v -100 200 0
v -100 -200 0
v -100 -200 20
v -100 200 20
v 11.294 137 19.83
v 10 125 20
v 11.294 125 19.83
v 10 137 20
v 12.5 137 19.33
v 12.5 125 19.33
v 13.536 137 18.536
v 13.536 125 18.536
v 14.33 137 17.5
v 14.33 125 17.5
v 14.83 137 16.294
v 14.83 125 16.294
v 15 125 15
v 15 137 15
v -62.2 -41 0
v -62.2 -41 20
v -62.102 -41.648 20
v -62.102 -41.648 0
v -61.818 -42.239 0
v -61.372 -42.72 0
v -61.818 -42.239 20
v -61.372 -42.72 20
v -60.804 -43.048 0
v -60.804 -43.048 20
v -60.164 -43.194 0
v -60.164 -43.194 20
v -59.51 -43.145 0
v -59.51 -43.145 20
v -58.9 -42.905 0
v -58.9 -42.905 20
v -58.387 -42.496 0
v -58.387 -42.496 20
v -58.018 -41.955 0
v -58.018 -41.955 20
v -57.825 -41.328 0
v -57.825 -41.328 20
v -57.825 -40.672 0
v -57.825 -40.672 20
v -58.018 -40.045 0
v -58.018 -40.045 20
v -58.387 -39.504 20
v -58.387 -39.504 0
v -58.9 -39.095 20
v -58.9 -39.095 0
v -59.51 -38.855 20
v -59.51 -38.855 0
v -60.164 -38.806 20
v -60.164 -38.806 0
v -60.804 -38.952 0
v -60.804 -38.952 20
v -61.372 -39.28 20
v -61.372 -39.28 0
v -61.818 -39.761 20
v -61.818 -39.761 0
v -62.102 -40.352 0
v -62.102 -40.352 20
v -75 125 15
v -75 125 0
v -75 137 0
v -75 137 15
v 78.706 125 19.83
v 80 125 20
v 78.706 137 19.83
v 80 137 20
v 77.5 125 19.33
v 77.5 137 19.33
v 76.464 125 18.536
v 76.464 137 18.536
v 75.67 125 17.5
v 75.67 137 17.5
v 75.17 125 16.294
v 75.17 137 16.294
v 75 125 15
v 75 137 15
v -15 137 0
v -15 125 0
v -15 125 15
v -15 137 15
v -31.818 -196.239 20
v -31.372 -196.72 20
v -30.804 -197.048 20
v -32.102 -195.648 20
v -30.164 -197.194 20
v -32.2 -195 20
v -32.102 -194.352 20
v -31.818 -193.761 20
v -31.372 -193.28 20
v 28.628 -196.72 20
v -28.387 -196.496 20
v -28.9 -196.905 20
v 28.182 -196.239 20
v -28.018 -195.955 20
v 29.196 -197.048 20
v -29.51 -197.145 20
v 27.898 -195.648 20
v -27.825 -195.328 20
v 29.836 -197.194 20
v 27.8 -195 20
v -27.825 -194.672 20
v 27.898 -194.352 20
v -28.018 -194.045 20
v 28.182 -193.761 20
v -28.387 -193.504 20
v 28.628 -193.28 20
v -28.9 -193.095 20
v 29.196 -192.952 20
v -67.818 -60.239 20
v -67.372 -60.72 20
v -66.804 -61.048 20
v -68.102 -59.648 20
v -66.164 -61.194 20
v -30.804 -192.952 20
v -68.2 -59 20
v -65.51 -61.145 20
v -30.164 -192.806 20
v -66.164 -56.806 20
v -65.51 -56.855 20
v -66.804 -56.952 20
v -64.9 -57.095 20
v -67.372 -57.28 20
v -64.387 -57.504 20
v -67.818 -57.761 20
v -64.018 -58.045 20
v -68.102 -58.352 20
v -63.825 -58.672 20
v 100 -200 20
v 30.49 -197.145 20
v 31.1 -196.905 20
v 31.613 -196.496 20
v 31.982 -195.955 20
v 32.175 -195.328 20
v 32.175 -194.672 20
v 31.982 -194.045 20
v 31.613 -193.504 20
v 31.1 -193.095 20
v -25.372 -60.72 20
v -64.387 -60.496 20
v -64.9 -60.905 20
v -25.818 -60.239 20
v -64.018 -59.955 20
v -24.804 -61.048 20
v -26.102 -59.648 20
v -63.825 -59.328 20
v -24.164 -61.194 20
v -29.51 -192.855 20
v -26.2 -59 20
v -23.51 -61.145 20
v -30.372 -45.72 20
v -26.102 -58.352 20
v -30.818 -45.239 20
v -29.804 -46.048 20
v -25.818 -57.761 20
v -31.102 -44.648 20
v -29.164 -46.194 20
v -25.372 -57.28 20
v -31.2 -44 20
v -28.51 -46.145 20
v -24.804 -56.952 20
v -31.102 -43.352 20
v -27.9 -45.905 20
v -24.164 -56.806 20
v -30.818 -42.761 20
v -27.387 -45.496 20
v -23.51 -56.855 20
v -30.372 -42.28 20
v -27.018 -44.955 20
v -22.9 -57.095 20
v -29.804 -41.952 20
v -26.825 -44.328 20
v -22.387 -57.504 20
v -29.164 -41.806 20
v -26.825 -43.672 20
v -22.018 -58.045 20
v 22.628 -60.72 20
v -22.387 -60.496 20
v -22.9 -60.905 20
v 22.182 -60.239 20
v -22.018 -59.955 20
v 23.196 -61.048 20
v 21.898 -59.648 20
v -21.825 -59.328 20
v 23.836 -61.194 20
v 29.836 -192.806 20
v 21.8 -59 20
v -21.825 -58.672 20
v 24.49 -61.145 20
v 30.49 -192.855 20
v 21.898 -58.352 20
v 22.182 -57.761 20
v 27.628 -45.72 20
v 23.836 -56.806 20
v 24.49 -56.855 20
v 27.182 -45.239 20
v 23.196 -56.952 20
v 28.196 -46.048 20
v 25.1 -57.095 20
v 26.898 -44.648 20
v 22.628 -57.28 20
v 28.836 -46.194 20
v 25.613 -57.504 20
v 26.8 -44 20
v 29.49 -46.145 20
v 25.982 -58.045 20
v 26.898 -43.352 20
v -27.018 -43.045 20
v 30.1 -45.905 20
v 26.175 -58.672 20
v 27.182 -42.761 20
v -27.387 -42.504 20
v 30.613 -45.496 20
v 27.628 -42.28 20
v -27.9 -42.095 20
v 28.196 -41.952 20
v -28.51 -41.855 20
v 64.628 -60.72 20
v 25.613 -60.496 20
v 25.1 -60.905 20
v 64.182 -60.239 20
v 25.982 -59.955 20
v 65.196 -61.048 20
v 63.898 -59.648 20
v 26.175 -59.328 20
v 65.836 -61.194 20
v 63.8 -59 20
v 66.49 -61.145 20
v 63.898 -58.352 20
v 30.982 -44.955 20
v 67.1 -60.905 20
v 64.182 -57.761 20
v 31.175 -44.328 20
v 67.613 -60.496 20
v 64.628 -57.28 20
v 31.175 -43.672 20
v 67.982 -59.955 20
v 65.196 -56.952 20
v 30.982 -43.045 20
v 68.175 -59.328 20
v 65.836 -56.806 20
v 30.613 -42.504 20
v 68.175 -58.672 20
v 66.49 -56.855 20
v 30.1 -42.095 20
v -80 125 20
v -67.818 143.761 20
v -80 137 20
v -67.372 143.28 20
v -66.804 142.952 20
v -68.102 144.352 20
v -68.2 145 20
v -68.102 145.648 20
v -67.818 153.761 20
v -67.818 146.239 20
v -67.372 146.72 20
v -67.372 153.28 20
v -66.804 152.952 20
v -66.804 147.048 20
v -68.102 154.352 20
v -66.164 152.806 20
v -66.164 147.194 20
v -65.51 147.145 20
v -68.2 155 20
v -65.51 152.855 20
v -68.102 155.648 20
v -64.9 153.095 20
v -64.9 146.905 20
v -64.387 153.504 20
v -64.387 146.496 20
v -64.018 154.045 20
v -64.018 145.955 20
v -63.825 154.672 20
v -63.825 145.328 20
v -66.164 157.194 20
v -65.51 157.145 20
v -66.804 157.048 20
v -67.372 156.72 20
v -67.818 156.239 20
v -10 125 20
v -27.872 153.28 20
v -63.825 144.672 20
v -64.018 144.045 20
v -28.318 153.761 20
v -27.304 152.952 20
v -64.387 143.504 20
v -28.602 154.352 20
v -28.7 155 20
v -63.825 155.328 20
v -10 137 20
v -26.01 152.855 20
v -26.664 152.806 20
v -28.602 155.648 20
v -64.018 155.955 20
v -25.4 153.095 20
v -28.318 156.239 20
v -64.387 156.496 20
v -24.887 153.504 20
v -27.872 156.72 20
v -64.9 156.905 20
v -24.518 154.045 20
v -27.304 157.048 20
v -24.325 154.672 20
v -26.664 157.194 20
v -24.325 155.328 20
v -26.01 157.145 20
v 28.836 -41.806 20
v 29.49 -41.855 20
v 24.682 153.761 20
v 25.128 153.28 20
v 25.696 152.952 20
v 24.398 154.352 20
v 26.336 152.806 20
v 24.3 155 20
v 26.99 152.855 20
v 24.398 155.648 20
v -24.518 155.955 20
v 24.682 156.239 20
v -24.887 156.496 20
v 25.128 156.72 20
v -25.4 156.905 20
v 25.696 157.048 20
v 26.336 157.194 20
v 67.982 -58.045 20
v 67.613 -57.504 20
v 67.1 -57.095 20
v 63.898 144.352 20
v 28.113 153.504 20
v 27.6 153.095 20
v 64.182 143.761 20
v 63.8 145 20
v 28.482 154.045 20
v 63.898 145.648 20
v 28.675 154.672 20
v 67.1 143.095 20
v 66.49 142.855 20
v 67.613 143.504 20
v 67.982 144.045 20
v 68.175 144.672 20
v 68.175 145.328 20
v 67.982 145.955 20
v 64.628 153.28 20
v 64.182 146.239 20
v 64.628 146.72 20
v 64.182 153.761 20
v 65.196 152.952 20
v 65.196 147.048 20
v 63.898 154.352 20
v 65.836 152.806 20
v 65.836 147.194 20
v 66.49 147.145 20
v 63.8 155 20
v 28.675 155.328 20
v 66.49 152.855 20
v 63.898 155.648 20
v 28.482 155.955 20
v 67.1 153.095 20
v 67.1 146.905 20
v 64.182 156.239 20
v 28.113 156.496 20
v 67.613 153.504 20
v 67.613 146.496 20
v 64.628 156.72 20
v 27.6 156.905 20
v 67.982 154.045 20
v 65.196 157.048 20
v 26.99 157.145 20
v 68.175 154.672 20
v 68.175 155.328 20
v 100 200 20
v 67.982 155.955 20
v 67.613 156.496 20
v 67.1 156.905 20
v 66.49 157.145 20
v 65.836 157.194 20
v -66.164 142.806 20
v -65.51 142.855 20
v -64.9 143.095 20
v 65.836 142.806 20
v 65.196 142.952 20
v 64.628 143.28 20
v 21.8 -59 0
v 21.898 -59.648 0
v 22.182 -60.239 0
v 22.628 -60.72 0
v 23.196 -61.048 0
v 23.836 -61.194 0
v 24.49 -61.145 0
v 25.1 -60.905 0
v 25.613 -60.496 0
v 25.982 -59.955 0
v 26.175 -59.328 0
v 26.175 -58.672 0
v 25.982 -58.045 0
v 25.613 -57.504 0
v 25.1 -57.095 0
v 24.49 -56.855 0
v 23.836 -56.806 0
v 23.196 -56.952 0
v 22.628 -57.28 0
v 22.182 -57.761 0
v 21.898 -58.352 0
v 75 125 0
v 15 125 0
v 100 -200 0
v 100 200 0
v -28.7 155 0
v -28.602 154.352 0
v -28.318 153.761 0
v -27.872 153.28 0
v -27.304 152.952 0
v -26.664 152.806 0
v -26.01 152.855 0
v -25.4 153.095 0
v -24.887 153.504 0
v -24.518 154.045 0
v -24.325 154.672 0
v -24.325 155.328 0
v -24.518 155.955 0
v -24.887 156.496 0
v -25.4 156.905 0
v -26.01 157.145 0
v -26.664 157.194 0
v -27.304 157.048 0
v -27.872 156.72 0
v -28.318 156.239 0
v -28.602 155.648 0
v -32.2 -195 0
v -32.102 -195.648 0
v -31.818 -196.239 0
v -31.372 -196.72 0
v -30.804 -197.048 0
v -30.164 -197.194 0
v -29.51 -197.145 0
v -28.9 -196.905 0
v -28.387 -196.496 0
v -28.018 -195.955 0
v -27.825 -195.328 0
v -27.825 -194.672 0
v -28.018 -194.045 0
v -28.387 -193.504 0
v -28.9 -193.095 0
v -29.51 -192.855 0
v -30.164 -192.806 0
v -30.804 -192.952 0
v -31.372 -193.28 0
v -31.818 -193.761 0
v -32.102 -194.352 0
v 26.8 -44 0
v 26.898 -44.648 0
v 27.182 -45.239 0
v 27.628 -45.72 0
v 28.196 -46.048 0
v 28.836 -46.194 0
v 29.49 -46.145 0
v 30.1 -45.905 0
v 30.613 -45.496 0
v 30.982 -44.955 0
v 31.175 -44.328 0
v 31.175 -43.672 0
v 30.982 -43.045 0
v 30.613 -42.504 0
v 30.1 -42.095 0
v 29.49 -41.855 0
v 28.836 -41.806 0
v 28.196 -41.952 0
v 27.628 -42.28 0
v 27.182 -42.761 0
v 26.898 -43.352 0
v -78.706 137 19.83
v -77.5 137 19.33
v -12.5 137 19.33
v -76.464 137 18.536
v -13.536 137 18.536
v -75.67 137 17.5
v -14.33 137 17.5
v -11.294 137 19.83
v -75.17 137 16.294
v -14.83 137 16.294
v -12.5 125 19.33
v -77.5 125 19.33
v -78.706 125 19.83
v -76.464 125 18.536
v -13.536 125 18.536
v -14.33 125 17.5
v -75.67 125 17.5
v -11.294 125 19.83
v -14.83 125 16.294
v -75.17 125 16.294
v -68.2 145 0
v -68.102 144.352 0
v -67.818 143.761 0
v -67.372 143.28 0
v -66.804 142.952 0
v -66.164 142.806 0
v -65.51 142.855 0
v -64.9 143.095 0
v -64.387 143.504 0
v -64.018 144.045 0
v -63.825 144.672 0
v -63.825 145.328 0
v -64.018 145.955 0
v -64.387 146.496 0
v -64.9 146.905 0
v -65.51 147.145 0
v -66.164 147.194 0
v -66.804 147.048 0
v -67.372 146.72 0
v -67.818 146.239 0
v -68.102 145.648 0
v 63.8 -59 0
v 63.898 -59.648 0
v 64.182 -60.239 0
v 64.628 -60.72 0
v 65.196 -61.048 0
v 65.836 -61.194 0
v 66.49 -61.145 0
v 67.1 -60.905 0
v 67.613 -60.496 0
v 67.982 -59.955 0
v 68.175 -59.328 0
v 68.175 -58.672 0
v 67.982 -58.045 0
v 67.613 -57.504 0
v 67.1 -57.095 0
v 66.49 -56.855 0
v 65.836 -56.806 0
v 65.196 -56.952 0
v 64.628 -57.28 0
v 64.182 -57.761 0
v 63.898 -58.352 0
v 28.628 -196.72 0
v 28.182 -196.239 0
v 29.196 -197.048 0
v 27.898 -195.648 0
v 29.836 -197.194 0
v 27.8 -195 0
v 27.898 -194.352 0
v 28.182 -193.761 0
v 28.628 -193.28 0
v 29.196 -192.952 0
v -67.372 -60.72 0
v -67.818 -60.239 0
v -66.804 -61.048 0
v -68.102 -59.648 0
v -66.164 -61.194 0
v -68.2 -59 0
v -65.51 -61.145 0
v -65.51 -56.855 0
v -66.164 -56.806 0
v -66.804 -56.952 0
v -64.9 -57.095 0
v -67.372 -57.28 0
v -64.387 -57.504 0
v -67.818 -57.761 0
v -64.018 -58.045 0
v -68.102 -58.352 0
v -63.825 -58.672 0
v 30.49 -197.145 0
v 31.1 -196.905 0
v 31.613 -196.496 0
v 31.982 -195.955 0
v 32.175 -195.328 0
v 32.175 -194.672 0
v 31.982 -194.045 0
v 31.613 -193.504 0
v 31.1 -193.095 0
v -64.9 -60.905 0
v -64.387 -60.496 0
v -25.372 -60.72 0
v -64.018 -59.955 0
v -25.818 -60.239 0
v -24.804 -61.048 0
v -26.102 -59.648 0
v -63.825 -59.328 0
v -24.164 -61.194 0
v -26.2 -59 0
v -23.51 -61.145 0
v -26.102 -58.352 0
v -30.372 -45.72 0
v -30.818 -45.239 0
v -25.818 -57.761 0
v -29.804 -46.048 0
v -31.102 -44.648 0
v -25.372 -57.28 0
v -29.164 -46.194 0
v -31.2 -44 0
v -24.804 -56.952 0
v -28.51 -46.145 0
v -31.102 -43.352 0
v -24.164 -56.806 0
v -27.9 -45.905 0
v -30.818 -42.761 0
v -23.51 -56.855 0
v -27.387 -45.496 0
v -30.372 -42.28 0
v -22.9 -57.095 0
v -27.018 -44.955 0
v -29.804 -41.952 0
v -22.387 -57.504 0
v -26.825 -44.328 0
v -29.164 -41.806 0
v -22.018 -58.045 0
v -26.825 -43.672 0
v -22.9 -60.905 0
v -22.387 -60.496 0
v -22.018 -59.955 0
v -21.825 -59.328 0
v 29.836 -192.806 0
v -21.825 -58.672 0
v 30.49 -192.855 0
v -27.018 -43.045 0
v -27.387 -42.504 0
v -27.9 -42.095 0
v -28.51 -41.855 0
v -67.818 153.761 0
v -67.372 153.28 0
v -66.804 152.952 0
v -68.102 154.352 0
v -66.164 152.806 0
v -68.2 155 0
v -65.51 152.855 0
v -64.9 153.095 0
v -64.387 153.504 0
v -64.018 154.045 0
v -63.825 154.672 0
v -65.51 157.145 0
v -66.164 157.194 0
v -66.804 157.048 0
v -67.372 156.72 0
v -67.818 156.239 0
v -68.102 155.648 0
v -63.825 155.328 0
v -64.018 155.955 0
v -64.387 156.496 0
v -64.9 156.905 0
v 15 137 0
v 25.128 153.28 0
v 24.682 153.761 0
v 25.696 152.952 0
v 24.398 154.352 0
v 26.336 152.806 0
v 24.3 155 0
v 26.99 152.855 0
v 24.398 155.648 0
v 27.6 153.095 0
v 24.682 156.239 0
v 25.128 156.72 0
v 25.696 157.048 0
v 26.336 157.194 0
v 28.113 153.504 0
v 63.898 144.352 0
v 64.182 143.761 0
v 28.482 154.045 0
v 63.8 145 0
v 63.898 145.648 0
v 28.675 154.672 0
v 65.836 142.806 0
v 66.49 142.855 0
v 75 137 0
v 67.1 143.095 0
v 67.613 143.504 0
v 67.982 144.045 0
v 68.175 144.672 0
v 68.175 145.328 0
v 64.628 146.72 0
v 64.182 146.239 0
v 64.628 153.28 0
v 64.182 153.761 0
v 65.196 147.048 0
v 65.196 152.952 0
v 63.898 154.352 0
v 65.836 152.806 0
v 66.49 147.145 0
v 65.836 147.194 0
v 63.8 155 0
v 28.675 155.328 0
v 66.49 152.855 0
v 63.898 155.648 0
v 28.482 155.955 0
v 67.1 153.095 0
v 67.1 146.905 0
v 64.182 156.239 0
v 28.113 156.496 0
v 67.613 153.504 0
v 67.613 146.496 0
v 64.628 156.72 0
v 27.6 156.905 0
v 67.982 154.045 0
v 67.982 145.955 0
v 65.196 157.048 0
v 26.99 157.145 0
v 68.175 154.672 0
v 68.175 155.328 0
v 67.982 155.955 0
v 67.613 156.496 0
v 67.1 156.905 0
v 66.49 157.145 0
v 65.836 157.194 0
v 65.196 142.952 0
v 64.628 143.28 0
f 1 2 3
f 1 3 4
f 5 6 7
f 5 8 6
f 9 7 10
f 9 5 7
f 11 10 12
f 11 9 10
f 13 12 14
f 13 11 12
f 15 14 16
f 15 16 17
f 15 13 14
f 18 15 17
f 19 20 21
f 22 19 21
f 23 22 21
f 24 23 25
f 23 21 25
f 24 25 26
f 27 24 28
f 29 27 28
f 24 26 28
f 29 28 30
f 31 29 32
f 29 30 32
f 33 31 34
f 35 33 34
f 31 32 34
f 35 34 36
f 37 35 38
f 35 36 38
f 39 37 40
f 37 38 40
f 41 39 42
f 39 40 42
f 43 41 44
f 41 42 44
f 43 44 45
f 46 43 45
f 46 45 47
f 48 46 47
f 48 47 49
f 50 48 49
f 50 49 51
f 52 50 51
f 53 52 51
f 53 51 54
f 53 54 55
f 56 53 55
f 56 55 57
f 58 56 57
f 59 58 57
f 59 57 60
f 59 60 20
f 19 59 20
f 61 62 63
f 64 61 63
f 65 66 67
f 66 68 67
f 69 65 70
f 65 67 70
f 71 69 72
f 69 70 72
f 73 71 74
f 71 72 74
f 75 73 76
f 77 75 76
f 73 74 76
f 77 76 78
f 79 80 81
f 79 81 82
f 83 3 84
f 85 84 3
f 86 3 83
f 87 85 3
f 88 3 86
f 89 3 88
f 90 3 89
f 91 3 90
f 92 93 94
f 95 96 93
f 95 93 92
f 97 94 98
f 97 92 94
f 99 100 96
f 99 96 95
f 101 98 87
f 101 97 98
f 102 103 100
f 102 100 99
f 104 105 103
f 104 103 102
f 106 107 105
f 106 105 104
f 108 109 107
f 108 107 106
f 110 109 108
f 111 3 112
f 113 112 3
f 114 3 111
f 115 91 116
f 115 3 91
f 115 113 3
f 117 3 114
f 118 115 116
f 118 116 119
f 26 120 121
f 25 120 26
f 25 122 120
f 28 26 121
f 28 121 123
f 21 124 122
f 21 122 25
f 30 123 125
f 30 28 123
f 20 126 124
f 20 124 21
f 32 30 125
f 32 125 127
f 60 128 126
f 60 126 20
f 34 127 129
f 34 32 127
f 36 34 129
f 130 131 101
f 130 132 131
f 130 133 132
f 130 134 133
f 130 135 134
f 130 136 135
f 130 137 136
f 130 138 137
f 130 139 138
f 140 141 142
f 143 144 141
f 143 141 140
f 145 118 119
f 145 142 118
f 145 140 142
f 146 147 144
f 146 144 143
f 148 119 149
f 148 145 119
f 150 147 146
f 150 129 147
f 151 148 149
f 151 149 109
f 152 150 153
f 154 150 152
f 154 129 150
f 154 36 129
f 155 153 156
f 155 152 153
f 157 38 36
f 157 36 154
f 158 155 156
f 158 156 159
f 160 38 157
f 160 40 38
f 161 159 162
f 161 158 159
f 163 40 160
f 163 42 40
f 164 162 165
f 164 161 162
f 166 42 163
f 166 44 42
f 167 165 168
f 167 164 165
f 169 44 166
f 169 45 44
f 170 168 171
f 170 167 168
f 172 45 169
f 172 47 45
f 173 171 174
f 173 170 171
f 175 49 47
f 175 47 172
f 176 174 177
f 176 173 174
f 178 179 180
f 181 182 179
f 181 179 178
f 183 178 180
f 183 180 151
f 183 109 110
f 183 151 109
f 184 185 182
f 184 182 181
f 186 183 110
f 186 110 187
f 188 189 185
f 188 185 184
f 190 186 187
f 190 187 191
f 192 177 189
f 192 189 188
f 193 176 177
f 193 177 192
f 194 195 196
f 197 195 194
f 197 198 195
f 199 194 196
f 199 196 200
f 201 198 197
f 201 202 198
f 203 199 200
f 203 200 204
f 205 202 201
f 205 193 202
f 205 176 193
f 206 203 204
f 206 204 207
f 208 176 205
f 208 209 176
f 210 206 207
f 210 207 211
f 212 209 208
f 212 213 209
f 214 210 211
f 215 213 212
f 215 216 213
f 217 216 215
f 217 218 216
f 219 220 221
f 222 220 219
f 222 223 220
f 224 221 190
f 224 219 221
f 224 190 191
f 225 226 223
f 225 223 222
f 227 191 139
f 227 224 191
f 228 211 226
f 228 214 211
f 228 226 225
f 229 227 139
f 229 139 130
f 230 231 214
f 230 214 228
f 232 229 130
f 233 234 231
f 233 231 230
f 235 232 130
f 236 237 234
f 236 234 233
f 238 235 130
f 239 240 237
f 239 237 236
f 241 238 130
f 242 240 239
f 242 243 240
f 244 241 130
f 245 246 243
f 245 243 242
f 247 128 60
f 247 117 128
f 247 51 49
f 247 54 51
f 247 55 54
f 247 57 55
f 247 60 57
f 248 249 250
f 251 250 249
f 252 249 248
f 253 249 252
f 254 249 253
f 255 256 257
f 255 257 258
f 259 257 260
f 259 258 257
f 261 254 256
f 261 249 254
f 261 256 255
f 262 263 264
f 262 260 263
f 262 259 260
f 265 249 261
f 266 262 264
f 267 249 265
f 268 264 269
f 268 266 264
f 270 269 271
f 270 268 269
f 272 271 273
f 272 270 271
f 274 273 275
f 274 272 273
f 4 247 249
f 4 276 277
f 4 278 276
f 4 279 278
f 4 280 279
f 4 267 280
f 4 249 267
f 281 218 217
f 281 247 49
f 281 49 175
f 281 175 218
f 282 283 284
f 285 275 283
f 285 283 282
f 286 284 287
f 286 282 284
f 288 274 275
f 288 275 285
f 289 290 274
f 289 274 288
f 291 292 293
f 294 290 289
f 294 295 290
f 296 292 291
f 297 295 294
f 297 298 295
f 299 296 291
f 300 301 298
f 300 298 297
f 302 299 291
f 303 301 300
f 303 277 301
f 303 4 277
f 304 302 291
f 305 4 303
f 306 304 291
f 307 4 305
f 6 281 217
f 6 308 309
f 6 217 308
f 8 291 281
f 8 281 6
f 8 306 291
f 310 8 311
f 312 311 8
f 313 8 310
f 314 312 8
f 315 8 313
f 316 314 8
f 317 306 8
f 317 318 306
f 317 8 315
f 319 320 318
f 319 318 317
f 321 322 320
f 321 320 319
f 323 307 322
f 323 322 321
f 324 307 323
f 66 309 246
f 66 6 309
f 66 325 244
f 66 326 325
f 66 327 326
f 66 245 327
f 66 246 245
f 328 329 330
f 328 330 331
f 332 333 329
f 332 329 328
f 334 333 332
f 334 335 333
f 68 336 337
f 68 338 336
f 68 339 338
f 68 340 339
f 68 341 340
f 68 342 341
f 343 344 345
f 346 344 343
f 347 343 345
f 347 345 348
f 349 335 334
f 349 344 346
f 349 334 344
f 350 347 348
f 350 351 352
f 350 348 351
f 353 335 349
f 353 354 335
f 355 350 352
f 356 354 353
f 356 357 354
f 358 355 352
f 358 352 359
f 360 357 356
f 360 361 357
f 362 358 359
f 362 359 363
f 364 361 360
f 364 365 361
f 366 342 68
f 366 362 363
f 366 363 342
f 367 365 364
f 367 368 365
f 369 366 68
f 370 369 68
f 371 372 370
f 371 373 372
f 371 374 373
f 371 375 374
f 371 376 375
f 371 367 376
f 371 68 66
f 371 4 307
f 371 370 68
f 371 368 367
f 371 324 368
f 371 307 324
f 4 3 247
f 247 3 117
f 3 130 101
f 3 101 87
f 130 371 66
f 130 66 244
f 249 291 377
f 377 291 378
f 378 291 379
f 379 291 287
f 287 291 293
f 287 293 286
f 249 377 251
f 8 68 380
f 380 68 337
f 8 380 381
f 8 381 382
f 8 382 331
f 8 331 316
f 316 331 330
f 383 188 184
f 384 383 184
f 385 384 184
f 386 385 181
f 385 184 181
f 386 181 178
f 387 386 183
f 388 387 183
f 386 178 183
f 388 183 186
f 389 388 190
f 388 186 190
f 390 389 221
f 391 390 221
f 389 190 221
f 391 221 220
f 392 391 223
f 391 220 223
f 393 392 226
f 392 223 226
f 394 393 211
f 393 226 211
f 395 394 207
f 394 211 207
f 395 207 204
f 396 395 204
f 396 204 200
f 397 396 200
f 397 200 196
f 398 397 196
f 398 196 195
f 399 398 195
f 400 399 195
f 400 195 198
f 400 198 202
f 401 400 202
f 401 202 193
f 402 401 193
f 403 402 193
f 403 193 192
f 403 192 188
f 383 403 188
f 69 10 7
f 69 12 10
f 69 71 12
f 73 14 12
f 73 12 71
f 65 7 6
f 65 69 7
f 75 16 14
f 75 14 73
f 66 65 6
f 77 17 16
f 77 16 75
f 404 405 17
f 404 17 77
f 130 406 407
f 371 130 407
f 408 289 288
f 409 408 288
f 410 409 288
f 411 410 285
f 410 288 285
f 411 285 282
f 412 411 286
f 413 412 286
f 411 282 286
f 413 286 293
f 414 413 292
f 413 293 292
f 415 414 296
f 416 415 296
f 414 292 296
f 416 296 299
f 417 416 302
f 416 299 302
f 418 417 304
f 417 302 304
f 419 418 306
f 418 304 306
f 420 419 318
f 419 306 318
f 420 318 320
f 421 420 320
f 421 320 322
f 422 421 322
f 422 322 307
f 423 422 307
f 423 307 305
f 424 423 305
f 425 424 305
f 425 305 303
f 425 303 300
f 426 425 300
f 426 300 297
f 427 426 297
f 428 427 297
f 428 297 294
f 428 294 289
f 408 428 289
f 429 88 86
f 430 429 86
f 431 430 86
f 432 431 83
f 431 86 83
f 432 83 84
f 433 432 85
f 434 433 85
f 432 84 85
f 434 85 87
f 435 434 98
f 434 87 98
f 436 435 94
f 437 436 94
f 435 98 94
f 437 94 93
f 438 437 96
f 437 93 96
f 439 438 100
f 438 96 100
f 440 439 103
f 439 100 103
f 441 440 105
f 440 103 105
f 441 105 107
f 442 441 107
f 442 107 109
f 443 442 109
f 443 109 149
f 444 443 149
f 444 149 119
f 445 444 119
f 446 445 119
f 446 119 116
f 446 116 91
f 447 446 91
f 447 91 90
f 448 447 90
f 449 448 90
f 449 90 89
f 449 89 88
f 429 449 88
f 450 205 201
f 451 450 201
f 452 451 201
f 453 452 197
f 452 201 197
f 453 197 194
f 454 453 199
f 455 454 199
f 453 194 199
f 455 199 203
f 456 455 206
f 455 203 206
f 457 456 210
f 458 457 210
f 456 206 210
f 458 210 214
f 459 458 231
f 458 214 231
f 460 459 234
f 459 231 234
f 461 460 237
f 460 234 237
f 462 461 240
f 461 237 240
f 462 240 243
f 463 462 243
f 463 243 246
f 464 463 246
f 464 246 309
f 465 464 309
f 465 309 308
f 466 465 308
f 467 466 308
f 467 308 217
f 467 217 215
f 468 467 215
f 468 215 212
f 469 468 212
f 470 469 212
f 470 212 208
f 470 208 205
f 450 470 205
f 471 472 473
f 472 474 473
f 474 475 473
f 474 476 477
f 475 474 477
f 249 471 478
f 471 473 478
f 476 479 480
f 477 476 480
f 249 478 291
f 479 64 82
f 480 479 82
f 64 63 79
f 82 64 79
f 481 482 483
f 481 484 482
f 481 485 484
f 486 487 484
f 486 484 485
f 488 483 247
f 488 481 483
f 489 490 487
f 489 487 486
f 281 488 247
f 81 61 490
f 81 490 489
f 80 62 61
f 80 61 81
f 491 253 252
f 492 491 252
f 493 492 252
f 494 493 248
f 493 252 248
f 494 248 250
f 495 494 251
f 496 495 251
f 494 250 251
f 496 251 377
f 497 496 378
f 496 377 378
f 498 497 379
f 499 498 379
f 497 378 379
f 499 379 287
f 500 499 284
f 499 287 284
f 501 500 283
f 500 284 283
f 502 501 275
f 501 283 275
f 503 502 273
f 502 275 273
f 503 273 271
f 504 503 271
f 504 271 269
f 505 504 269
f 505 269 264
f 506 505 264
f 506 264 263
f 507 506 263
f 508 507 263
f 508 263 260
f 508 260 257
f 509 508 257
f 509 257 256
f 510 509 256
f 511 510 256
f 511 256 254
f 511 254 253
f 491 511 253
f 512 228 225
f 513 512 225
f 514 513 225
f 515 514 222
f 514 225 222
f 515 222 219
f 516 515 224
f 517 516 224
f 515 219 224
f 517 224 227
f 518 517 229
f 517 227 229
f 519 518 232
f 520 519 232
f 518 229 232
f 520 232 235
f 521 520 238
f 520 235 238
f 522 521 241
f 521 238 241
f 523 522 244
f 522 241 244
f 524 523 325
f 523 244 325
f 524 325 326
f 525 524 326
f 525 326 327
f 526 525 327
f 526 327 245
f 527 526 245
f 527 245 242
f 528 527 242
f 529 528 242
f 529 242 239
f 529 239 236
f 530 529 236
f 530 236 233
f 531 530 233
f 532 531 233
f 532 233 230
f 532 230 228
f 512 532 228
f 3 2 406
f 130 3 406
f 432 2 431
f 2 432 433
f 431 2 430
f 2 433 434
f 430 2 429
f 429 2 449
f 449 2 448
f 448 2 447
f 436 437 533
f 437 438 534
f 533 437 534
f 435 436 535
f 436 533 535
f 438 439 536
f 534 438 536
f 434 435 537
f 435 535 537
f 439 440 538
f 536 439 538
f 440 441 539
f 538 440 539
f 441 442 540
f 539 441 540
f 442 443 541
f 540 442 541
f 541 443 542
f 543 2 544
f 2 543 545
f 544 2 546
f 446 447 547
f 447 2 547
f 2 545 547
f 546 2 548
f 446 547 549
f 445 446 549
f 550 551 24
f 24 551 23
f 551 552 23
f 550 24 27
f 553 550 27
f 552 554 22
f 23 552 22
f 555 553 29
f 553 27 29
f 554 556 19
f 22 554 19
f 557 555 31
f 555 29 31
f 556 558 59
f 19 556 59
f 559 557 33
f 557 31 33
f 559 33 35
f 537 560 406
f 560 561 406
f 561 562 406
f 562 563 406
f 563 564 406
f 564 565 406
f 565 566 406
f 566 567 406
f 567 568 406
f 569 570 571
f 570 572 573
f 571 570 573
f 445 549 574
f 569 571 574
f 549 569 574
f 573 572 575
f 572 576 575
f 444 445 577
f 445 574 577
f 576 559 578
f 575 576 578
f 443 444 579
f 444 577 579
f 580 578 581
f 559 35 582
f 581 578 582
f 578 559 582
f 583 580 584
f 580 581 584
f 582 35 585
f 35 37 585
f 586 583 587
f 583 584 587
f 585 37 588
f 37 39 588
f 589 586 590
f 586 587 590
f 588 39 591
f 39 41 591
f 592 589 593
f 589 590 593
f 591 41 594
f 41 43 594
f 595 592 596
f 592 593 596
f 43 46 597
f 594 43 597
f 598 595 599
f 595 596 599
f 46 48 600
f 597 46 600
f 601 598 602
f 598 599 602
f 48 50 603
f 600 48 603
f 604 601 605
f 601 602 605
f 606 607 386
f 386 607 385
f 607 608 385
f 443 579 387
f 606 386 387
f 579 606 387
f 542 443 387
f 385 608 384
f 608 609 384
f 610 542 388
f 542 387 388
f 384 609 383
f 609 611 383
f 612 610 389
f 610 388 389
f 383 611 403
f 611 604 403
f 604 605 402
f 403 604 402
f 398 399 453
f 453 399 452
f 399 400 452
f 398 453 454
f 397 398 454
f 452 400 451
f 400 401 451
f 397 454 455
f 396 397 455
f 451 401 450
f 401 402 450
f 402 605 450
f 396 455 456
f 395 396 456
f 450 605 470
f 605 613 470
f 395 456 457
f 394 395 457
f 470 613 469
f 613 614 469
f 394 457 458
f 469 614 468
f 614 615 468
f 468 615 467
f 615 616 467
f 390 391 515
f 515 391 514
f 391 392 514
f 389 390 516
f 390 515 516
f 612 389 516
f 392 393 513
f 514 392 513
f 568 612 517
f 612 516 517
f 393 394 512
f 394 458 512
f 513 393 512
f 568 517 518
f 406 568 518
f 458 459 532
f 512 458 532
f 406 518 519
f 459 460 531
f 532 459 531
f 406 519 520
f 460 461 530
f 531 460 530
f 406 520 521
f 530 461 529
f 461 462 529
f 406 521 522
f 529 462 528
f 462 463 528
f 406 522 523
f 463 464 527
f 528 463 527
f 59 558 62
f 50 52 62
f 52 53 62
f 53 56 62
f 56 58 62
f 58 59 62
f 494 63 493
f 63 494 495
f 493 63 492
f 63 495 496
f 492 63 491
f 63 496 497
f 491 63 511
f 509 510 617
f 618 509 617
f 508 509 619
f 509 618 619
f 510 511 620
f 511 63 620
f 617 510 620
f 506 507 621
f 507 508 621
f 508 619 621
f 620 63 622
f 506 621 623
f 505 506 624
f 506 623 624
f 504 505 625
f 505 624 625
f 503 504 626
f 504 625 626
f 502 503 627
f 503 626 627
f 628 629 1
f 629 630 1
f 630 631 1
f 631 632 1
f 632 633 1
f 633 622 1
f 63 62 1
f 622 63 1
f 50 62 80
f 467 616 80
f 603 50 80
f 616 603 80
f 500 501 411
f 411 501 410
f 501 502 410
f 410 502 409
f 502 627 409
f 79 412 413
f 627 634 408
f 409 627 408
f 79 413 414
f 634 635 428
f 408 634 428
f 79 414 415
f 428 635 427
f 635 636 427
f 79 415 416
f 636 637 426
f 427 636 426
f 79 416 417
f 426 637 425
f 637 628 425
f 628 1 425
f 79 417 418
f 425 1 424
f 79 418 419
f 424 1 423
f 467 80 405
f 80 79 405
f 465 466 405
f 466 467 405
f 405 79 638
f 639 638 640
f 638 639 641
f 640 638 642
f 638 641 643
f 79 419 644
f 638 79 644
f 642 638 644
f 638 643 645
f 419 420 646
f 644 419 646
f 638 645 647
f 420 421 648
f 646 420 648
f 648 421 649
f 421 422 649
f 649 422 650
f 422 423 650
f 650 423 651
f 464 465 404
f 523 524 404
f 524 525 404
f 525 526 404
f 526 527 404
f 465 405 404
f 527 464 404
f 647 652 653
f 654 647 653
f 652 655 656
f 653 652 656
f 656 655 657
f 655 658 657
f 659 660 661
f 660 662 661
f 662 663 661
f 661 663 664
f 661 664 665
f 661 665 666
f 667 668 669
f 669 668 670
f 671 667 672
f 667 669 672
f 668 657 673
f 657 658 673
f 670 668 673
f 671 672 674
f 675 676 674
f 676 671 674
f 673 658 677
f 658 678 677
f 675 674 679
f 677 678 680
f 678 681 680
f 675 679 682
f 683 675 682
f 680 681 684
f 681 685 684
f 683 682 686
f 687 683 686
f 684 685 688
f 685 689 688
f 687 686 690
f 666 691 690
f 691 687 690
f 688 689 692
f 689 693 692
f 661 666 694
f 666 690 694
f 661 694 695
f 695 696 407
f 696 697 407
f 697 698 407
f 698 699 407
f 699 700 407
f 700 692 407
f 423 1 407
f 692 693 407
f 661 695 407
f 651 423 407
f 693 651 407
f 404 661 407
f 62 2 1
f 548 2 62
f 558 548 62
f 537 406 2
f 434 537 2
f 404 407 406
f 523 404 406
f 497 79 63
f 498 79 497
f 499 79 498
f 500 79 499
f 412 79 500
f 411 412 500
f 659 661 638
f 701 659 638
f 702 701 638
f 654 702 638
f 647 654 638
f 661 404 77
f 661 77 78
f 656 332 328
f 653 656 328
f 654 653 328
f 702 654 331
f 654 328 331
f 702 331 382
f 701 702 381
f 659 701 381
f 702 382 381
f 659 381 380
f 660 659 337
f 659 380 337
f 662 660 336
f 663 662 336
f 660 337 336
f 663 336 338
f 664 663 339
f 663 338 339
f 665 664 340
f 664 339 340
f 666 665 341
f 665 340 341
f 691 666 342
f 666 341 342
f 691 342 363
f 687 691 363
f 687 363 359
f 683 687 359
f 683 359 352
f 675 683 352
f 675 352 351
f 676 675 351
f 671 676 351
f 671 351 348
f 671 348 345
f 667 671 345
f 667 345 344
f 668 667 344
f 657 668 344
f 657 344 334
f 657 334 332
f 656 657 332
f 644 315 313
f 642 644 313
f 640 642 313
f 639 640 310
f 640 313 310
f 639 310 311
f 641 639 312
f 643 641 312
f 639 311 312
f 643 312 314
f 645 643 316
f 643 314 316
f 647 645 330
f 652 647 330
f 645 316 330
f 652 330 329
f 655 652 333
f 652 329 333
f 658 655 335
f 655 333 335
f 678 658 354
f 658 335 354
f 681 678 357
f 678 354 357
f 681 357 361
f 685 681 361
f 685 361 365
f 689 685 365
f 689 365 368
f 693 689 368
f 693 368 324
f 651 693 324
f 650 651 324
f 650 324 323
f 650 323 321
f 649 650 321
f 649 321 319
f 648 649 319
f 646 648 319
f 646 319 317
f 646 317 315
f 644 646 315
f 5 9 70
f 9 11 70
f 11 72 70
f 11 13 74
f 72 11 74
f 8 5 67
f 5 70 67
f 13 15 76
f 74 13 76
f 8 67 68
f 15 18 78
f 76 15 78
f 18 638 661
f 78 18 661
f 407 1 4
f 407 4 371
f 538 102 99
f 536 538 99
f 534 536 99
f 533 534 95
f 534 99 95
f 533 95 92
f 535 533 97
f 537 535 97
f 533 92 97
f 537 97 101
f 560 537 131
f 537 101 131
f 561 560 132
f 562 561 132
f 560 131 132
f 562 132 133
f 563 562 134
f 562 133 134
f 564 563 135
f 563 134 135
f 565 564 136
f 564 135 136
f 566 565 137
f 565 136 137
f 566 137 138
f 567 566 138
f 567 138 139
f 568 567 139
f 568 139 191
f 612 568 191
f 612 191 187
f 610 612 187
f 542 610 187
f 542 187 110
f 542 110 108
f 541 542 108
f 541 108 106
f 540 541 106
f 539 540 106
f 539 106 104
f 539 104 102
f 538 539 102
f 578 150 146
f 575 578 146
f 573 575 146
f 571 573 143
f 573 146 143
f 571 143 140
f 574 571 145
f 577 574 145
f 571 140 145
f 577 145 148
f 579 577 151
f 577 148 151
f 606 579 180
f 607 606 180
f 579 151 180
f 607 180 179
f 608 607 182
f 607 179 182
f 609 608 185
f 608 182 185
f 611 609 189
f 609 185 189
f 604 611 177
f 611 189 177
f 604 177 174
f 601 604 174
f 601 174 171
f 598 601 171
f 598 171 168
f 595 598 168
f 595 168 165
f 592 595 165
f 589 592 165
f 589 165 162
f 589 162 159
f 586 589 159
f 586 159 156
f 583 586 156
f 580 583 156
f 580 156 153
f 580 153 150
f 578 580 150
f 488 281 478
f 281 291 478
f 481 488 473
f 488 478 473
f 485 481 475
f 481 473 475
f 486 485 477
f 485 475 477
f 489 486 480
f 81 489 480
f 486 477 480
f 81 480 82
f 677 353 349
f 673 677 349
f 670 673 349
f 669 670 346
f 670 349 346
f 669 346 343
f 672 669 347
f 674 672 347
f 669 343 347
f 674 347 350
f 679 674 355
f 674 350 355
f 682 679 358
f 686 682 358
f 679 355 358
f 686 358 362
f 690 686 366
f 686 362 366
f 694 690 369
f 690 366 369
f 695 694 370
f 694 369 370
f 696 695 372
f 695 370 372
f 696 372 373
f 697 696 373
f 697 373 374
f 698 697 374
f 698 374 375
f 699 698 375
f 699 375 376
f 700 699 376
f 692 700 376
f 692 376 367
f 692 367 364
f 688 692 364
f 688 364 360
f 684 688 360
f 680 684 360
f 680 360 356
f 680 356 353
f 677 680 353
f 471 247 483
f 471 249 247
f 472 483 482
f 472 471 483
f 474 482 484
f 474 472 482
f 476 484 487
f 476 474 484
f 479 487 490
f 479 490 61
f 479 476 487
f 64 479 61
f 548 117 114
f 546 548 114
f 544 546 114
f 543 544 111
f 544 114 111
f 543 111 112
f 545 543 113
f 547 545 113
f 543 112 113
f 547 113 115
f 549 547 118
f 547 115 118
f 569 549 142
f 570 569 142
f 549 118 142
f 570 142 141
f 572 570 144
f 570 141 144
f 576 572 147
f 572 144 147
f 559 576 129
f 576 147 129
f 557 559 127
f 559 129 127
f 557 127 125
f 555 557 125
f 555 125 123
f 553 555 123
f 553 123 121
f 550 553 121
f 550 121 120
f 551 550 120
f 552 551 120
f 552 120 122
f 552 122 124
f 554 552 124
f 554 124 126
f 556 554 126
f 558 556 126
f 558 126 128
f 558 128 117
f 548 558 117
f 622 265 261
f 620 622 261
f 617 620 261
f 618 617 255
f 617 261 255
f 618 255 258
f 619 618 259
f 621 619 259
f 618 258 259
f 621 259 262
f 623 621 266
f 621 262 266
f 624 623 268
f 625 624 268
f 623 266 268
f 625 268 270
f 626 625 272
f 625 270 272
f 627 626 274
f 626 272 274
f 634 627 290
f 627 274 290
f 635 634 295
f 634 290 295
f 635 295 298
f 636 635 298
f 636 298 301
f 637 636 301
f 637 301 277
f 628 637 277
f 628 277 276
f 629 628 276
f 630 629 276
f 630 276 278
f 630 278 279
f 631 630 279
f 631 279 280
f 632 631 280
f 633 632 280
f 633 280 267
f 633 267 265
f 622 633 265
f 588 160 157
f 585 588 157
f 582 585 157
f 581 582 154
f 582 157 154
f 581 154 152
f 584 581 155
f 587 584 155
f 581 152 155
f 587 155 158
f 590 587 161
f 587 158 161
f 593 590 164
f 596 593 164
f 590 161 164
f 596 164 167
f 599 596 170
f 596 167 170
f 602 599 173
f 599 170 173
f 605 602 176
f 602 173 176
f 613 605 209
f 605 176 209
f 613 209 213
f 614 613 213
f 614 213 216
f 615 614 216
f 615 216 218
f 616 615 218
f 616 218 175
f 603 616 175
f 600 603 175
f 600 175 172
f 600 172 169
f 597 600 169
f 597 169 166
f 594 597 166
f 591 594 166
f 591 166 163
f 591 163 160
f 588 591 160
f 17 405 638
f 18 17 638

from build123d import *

# Parameters (mm, degrees)
F0_W     = 200
F0_H     = 400
F0_W_2   = 60
F0_H_2   = 12
F1_DEPTH = 20
F2_D     = 4.4
F3_R     = 5


with BuildPart() as f1:
    # F0 (on Top) → F1 (new body)
    with BuildSketch(Plane.XY):
        Rectangle(F0_W, F0_H)
        with Locations((-45, 131)):
            Rectangle(F0_W_2, F0_H_2, mode=Mode.SUBTRACT)
        with Locations((45, 131)):
            Rectangle(F0_W_2, F0_H_2, mode=Mode.SUBTRACT)
    extrude(amount=F1_DEPTH)

    # F2 (through all)
    with Locations(Plane(origin=(0, 0, 0), x_dir=(1, 0, 0), z_dir=(0, 0, -1))):
        with Locations((-26.5, -155), (26.5, -155), (-66, 59), (-24, 59), (24, 59), (66, 59), (-66, -155), (-66, -145), (66, -155), (66, -145), (-29, 44), (29, 44), (-30, 195), (30, 195), (-60, 41)):
            Hole(F2_D / 2)

    # F3
    f3_edges = [f1.edges().sort_by_distance(p)[0] for p in [
        (-75, 131, 20),
        (-15, 131, 20),
        (15, 131, 20),
        (75, 131, 20),
    ]]
    fillet(f3_edges, radius=F3_R)


solid = f1.part
